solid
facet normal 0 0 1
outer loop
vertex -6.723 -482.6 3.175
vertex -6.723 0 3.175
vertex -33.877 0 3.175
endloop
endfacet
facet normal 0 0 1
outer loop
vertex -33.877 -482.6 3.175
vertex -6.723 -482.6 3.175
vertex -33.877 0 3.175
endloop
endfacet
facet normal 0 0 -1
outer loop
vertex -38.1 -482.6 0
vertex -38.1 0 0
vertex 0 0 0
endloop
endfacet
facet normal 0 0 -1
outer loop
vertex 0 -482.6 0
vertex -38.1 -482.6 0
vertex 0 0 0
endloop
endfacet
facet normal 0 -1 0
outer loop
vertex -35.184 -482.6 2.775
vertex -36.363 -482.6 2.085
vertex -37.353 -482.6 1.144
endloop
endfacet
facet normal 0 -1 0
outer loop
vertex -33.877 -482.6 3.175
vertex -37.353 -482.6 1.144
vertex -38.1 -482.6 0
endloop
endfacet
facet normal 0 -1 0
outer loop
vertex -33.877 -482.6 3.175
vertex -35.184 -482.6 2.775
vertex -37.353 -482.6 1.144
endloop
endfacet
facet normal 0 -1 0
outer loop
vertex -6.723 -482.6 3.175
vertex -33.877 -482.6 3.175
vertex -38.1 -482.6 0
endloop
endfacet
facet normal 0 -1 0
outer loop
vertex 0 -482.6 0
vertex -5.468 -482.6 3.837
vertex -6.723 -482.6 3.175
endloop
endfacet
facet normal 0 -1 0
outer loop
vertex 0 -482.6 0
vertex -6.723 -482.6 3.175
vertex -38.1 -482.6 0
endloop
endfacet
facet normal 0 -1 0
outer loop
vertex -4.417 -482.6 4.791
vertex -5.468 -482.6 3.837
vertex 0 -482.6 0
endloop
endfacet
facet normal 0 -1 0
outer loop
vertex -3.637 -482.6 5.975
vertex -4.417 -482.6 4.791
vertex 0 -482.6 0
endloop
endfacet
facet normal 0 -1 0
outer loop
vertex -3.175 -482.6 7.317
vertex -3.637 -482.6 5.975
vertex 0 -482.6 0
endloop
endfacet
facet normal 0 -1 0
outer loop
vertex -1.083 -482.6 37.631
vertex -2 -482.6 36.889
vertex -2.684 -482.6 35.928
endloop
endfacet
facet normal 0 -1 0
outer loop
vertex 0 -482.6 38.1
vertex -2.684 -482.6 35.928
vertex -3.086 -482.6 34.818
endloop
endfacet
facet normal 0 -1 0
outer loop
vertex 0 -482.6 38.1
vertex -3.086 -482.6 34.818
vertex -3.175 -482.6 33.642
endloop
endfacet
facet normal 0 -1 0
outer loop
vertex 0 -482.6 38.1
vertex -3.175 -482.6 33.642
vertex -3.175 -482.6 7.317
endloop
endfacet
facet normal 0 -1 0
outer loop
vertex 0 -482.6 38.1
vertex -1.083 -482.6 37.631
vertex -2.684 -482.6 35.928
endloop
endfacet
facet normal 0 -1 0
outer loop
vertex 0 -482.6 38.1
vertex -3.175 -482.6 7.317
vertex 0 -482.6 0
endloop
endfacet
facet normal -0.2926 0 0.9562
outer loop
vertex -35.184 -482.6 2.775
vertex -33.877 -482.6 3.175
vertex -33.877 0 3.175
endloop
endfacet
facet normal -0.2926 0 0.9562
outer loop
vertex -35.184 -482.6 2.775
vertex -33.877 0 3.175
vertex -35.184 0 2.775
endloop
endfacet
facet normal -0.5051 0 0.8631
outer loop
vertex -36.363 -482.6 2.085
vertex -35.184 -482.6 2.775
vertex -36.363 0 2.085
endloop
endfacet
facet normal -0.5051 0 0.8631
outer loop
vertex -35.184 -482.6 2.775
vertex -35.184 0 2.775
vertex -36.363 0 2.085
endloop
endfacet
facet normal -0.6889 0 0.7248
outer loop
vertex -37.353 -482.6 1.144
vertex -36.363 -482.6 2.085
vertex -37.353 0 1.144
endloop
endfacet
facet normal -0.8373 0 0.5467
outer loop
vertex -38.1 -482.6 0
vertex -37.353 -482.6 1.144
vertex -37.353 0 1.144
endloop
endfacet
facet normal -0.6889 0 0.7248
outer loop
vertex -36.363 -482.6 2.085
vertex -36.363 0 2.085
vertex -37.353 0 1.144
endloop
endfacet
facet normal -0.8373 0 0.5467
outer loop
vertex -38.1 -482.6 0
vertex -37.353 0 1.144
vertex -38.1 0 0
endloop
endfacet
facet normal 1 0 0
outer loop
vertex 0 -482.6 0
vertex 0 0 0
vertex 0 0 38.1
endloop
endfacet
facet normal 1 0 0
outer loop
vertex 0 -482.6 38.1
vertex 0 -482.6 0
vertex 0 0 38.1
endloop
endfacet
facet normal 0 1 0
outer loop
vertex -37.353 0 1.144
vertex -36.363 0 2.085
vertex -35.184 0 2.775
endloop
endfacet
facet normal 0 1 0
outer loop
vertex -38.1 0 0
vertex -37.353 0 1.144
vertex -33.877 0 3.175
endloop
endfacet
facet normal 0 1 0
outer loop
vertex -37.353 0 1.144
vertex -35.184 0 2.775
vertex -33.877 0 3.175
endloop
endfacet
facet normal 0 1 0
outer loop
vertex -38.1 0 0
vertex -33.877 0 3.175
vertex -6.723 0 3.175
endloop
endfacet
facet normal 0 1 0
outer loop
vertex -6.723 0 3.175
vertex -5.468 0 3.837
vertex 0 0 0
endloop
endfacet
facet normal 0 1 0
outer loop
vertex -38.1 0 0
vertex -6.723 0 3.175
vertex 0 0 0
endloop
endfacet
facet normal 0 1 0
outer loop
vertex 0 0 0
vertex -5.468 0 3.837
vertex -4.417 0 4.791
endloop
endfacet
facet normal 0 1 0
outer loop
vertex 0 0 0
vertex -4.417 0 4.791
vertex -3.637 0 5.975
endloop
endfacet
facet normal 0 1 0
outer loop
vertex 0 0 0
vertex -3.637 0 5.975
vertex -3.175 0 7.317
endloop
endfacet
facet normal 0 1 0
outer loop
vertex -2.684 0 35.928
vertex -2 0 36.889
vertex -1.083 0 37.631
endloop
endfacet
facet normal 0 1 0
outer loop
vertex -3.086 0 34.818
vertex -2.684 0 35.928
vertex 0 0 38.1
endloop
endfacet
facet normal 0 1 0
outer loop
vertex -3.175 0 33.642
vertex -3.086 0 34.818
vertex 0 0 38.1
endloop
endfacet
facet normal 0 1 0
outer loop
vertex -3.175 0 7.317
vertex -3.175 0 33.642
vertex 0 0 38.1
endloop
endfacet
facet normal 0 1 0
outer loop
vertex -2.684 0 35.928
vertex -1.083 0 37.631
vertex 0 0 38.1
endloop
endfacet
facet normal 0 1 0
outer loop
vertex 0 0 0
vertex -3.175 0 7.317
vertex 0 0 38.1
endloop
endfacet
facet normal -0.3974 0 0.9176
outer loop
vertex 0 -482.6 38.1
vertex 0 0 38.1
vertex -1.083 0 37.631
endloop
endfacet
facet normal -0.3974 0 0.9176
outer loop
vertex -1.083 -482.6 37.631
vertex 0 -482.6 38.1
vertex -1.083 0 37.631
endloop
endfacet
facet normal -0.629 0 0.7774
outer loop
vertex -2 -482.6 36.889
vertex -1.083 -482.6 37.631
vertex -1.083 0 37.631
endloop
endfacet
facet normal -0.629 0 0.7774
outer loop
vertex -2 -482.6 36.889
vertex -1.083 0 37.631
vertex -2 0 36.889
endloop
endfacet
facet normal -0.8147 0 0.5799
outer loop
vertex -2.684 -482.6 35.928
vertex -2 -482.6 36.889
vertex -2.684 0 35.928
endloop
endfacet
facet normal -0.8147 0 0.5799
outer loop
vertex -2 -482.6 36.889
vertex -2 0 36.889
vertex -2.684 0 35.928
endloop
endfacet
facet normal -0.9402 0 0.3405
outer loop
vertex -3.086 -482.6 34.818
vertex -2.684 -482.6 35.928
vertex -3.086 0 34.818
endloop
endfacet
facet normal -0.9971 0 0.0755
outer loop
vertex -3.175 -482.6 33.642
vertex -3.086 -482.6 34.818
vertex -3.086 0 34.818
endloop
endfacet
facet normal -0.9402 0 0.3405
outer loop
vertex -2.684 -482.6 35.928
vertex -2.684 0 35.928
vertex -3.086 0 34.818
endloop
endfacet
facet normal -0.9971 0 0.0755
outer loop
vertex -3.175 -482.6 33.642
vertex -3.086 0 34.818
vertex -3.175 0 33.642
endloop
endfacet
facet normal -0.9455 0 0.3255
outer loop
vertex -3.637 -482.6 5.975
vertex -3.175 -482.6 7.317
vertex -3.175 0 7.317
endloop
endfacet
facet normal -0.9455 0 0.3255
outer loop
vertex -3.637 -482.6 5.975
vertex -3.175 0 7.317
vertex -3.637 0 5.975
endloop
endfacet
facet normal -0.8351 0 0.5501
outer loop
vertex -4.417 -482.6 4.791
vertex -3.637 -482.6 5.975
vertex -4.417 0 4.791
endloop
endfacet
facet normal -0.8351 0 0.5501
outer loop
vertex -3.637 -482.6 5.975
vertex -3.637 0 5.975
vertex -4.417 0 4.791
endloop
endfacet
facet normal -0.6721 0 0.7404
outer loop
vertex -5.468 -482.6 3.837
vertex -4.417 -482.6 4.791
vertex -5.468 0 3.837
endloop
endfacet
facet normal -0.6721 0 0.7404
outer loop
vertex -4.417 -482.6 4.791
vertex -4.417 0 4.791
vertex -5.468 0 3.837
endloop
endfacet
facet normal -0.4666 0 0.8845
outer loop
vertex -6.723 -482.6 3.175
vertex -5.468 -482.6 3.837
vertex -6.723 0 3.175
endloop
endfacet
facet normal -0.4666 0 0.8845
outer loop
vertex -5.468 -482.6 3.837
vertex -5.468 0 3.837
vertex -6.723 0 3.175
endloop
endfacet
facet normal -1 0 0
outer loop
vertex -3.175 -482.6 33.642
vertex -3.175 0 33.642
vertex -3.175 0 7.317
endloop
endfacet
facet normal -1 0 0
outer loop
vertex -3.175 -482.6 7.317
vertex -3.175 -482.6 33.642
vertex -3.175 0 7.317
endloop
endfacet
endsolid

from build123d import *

# Parameters (mm, degrees)
F1_DEPTH = 482.6


with BuildPart() as f1:
    # F0 (on Front) → F1 (new body)
    with BuildSketch(Plane.XZ):
        with BuildLine():
            Line((-3.175, 0), (0, 0))
            Line((0, 0), (0, 3.175))
            Line((0, 3.175), (0, 38.1))
            ThreePointArc((0, 38.1), (-2.374811, 36.431428), (-3.175, 33.641525))
            Line((-3.175, 33.641525), (-3.175, 7.316625))
            ThreePointArc((-3.175, 7.316625), (-4.417453, 4.790697), (-6.722561, 3.175))
            Line((-6.722561, 3.175), (-33.87744, 3.175))
            ThreePointArc((-33.87744, 3.175), (-36.362901, 2.085139), (-38.1, 0))
            Line((-38.1, 0), (-3.175, 0))
        make_face()
    extrude(amount=F1_DEPTH)


solid = f1.part
